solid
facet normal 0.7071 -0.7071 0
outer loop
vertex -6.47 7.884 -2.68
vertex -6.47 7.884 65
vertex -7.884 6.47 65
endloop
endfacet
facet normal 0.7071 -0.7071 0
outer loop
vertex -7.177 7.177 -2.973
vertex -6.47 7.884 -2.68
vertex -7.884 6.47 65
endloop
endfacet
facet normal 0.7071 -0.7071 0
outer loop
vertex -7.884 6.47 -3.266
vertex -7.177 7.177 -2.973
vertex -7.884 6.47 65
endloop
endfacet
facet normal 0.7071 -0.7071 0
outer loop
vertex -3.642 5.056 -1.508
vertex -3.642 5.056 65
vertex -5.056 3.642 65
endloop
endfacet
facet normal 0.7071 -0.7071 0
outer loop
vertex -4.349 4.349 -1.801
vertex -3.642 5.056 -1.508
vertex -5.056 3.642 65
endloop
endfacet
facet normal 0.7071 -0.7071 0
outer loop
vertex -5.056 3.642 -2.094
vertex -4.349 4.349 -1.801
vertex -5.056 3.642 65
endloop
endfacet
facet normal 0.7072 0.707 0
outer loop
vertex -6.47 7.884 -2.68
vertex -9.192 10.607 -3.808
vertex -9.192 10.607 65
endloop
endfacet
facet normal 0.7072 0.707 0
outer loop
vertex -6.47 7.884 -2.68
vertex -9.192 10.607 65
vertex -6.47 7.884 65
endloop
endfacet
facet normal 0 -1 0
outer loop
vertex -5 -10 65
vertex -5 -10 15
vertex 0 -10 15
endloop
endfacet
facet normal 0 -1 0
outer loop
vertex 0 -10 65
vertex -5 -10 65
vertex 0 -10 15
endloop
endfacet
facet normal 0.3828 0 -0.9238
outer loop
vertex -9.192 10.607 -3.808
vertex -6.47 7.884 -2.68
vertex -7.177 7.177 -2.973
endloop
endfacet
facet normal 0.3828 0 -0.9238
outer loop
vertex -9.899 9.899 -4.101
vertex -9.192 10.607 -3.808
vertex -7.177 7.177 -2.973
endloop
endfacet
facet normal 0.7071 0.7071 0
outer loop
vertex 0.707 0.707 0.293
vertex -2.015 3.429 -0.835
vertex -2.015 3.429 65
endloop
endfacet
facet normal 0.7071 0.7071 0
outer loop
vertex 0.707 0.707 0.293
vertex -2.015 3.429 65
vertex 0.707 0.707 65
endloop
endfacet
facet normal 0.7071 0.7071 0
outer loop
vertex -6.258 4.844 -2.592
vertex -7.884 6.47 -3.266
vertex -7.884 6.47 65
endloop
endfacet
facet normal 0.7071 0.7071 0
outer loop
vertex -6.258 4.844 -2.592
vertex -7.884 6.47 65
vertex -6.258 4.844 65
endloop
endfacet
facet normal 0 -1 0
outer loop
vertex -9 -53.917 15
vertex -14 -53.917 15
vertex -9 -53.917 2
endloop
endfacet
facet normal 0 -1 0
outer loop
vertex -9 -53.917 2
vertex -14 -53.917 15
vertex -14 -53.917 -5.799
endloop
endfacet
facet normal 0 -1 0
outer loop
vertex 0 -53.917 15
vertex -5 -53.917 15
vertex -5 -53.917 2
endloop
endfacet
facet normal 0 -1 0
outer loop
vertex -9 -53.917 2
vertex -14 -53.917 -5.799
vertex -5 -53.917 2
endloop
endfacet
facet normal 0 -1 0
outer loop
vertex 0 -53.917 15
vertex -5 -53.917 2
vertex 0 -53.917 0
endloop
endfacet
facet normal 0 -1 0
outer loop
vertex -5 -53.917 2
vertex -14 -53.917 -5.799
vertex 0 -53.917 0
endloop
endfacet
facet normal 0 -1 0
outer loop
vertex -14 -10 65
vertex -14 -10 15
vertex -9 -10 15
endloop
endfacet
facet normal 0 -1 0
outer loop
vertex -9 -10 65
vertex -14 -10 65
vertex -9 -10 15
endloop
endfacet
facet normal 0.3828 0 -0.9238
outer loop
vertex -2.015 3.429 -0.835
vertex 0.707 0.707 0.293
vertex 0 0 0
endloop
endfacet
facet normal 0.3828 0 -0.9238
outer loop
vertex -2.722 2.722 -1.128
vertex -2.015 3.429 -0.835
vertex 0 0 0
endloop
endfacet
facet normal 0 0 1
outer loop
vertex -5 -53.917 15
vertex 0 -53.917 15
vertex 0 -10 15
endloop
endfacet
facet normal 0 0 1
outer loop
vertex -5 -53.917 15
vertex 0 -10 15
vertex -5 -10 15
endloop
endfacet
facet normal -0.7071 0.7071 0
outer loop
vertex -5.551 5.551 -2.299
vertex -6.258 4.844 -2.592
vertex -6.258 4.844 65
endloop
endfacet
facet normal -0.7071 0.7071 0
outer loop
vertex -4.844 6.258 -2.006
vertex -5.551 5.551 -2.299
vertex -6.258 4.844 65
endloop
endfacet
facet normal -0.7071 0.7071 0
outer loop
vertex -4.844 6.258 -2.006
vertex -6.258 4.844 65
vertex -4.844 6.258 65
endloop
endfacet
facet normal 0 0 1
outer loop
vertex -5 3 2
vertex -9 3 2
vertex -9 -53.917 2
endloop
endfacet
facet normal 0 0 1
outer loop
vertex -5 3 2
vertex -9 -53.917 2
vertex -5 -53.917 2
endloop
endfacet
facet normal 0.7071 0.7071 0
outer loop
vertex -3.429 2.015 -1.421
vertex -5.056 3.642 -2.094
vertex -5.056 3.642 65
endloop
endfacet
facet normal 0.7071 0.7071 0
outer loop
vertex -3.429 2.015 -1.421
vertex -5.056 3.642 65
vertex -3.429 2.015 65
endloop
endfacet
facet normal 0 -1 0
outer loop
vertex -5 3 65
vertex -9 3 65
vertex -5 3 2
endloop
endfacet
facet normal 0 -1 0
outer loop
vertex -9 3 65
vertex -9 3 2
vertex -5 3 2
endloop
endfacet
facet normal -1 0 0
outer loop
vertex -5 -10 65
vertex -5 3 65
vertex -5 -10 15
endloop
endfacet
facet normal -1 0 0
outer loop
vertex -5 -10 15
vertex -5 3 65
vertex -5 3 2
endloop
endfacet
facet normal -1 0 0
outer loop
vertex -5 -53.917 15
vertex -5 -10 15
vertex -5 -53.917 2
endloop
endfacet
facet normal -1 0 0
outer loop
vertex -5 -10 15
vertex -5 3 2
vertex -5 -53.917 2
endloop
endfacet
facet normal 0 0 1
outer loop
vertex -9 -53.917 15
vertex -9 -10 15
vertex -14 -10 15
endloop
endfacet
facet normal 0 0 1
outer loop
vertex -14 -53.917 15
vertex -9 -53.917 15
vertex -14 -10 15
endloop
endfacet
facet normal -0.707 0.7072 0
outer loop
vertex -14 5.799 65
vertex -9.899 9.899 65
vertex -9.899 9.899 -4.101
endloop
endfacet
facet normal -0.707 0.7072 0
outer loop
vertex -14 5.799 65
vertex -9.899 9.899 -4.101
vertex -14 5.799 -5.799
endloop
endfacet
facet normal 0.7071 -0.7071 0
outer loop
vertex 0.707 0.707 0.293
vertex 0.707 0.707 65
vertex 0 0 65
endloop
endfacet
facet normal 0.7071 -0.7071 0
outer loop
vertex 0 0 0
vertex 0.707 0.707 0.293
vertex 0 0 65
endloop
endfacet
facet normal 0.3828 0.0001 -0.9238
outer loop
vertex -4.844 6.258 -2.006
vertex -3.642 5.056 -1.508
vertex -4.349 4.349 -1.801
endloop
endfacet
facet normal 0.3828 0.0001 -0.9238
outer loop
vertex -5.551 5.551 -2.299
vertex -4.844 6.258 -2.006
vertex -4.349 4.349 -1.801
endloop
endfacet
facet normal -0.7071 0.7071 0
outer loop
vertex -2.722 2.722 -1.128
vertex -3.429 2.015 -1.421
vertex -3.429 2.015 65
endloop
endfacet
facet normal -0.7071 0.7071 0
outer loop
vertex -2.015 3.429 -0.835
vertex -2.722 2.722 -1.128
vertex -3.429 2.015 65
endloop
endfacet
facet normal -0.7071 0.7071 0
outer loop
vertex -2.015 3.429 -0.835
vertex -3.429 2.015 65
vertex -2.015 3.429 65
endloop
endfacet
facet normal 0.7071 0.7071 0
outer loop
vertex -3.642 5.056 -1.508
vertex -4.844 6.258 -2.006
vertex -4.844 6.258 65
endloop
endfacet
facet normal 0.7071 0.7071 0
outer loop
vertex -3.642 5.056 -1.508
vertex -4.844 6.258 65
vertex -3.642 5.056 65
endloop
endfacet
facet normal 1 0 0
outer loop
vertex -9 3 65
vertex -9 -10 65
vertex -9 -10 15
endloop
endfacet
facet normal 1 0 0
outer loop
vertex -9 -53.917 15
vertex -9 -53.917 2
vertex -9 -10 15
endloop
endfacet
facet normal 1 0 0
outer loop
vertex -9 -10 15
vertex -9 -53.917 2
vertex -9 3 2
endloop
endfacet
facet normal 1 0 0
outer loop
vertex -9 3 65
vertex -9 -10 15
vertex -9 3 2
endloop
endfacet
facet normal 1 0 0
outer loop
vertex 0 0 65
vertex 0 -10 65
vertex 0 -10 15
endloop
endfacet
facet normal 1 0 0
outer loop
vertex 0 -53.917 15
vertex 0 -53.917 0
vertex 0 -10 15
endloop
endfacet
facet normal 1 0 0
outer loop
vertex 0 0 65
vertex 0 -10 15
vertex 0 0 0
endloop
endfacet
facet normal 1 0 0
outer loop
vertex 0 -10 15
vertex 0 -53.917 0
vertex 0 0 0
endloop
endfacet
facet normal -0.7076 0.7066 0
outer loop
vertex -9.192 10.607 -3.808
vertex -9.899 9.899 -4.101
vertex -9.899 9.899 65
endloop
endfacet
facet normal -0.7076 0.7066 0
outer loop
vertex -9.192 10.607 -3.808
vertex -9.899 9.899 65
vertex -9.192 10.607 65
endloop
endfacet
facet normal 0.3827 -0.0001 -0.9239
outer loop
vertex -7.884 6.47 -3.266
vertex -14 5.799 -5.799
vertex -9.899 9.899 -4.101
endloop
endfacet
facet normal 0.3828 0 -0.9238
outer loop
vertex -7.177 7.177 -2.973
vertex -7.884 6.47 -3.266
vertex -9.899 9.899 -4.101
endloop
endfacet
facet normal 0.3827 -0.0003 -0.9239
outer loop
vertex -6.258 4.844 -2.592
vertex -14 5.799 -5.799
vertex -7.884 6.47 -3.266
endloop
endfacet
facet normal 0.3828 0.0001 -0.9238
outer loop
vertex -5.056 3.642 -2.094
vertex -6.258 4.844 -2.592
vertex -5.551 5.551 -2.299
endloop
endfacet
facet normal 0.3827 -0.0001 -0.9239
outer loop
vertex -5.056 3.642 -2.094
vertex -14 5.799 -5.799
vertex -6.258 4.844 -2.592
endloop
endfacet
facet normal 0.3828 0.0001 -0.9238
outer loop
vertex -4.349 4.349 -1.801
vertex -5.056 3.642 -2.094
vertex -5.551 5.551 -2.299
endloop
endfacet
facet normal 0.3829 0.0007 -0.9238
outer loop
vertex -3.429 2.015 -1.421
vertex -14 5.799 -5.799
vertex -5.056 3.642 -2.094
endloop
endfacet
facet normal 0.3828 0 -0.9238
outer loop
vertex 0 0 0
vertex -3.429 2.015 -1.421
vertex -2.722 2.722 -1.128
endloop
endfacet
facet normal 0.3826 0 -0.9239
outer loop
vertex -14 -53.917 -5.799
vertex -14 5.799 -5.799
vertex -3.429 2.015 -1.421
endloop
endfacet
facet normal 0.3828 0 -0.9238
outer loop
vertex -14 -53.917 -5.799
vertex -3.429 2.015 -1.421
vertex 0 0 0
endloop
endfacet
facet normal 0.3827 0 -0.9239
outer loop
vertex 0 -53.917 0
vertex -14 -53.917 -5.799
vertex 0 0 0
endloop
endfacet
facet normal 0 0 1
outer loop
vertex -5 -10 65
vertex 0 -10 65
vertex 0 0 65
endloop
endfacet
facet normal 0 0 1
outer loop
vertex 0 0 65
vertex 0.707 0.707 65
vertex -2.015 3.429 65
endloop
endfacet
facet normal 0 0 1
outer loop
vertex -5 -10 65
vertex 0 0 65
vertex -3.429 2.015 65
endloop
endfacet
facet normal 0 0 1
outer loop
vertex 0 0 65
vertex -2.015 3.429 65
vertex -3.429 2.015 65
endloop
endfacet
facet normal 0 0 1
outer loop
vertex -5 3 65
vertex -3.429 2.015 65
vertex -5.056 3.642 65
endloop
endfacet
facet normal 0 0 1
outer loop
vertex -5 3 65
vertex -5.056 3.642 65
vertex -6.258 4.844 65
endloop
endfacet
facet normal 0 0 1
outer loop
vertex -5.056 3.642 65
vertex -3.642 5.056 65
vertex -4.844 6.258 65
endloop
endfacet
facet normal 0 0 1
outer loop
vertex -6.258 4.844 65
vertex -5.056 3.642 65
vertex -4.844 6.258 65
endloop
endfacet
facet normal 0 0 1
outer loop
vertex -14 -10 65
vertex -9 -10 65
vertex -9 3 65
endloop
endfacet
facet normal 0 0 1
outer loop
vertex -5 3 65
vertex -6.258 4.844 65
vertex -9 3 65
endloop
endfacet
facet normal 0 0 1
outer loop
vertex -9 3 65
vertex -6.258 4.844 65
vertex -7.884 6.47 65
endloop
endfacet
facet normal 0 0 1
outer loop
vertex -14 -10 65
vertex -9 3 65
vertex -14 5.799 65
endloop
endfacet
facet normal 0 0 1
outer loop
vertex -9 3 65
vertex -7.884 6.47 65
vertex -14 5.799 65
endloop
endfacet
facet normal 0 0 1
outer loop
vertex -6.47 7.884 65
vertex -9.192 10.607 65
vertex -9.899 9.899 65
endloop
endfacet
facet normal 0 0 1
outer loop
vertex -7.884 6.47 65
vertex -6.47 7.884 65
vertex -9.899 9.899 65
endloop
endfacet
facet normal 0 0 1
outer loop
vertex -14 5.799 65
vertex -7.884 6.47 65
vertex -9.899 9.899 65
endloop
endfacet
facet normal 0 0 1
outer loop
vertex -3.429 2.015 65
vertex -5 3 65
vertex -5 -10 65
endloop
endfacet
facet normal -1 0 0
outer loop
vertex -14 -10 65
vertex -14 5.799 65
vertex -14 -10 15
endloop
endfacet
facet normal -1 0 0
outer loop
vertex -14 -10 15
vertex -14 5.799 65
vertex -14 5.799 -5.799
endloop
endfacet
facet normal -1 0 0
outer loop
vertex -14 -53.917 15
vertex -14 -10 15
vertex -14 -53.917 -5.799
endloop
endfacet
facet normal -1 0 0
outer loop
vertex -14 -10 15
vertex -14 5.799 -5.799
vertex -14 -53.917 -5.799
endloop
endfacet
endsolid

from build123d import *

# Parameters (mm, degrees)
BOSS_EXTRUDE2_START       = -53.9167663
BOSS_EXTRUDE2_DEPTH       = 53.9167663
BOSS_EXTRUDE2_START_2     = -5.234980118
BOSS_EXTRUDE2_2_DEPTH     = 20.234980118
BOSS_EXTRUDE2_START_3     = -5.798989873
BOSS_EXTRUDE2_3_DEPTH     = 2.136888219
BOSS_EXTRUDE2_4_OUTLINE_W = 4
BOSS_EXTRUDE2_4_OUTLINE_H = 13
BOSS_EXTRUDE2_4_DEPTH     = 15
BOSS_EXTRUDE3_DEPTH       = 13
BOSS_EXTRUDE4_DEPTH       = 50
CUT_EXTRUDE2_DEPTH        = 91.086151296
BOSS_EXTRUDE12_REACH      = 92.086
CUT_EXTRUDE6_REACH        = 92.086


with BuildPart() as part:
    # Boss-Extrude2: read off the stored shape, not the designer's step
    # Boss-Extrude2 outline → Boss-Extrude2 (new body)
    with BuildSketch(Plane(origin=(0, 0, 0), x_dir=(1, 0, 0), z_dir=(0, 1, 0)).offset(BOSS_EXTRUDE2_START)):
        Polygon((0, -15), (0, 0), (-14, 5.798989873), (-14, -15), (-9, -15), (-9, -2), (-5, -2), (-5, -15), align=None)
    extrude(amount=BOSS_EXTRUDE2_DEPTH)



with BuildPart() as body_2:
    # Boss-Extrude2 2 outline → Boss-Extrude2 2 (new body)
    with BuildSketch(Plane.XY.offset(BOSS_EXTRUDE2_START_2)):
        Polygon((-14, 0), (0, 0), (-14, 14), align=None)
    extrude(amount=BOSS_EXTRUDE2_2_DEPTH)


with BuildPart() as part_1:
    add(part.part)

    add(body_2.part)  # Boss-Extrude2 3 merges body 2
    # Boss-Extrude2 3 outline → Boss-Extrude2 3 (add)
    with BuildSketch(Plane.XY.offset(BOSS_EXTRUDE2_START_3)):
        Polygon((-14, 0), (-9, 0), (-9, 9), (-14, 14), align=None)
    extrude(amount=BOSS_EXTRUDE2_3_DEPTH)

    # Boss-Extrude2 4 outline → Boss-Extrude2 4 (cut)
    with BuildSketch(Plane(origin=(0, 0, 0), x_dir=(1, 0, 0), z_dir=(0, 1, 0))):
        Polygon((0, 5.234980118), (-9, 5.234980118), (-9, 5.798989873), (-14, 5.798989873), (0, 0), align=None)
        with Locations((-7, -8.5)):
            Rectangle(BOSS_EXTRUDE2_4_OUTLINE_W, BOSS_EXTRUDE2_4_OUTLINE_H)
    extrude(amount=BOSS_EXTRUDE2_4_DEPTH, mode=Mode.SUBTRACT)

    # Sketch4 → Boss-Extrude3 (add)
    with BuildSketch(Plane.XY.offset(2)):
        Polygon((-5, 5), (-5, 3), (-9, 3), (-9, 9), align=None)
    extrude(amount=BOSS_EXTRUDE3_DEPTH)

    # Sketch5 → Boss-Extrude4 (add)
    with BuildSketch(Plane.XY.offset(15)):
        Polygon((-9, -10), (-9, 3), (-5, 3), (-5, -10), (0, -10), (0, 0), (-14, 14), (-14, -10), align=None)
    extrude(amount=BOSS_EXTRUDE4_DEPTH)

    # Sketch11 → Cut-Extrude2 (cut, through all)
    with BuildSketch(Plane.XY.offset(65)):
        Polygon((-9.899494937, 9.899494937), (-14, 5.798989873), (-14, 14), align=None)
    extrude(amount=-CUT_EXTRUDE2_DEPTH, mode=Mode.SUBTRACT)

    # Boss-Extrude12: up to this plane
    boss_extrude12_end = Plane(origin=(0, -53.9167663, 0), z_dir=(0.38268343236508406, 0, -0.9238795325112893))
    # Sketch21 → Boss-Extrude12 (add, up to the surface)
    with BuildSketch(Plane.XY.offset(65), mode=Mode.PRIVATE) as boss_extrude12_sk1:
        Polygon((-9.899494937, 9.899494937), (-9.192388155, 10.606601718), (0.707106781, 0.707106781), (0, 0), align=None)
    boss_extrude12_tool1 = split(extrude(boss_extrude12_sk1.sketch, amount=-BOSS_EXTRUDE12_REACH, mode=Mode.PRIVATE), bisect_by=boss_extrude12_end, keep=Keep.BOTH, mode=Mode.PRIVATE)
    add(boss_extrude12_tool1.solids().sort_by_distance((-4.596194, 5.303301, 65))[0])

    # Cut-Extrude6: up to this plane
    cut_extrude6_end = Plane(origin=(0, -53.9167663, 0), z_dir=(0.38268343236508406, 0, -0.9238795325112893))
    # Sketch22 → Cut-Extrude6 (cut, up to the surface)
    with BuildSketch(Plane.XY.offset(65), mode=Mode.PRIVATE) as cut_extrude6_sk1:
        Polygon((-3.429467889, 2.015254326), (-2.015254326, 3.429467889), (-3.641599923, 5.055813485), (-5.055813485, 3.641599923), align=None)
    cut_extrude6_tool1 = split(extrude(cut_extrude6_sk1.sketch, amount=-CUT_EXTRUDE6_REACH, mode=Mode.PRIVATE), bisect_by=cut_extrude6_end, keep=Keep.BOTH, mode=Mode.PRIVATE)
    add(cut_extrude6_tool1.solids().sort_by_distance((-3.535534, 3.535534, 65))[0], mode=Mode.SUBTRACT)
    # Sketch22 → Cut-Extrude6 (cut, up to the surface)
    with BuildSketch(Plane.XY.offset(65), mode=Mode.PRIVATE) as cut_extrude6_sk2:
        Polygon((-6.257895014, 4.843681451), (-4.843681451, 6.257895014), (-6.470027048, 7.88424061), (-7.88424061, 6.470027048), align=None)
    cut_extrude6_tool2 = split(extrude(cut_extrude6_sk2.sketch, amount=-CUT_EXTRUDE6_REACH, mode=Mode.PRIVATE), bisect_by=cut_extrude6_end, keep=Keep.BOTH, mode=Mode.PRIVATE)
    add(cut_extrude6_tool2.solids().sort_by_distance((-6.363961, 6.363961, 65))[0], mode=Mode.SUBTRACT)


solid = part_1.part
